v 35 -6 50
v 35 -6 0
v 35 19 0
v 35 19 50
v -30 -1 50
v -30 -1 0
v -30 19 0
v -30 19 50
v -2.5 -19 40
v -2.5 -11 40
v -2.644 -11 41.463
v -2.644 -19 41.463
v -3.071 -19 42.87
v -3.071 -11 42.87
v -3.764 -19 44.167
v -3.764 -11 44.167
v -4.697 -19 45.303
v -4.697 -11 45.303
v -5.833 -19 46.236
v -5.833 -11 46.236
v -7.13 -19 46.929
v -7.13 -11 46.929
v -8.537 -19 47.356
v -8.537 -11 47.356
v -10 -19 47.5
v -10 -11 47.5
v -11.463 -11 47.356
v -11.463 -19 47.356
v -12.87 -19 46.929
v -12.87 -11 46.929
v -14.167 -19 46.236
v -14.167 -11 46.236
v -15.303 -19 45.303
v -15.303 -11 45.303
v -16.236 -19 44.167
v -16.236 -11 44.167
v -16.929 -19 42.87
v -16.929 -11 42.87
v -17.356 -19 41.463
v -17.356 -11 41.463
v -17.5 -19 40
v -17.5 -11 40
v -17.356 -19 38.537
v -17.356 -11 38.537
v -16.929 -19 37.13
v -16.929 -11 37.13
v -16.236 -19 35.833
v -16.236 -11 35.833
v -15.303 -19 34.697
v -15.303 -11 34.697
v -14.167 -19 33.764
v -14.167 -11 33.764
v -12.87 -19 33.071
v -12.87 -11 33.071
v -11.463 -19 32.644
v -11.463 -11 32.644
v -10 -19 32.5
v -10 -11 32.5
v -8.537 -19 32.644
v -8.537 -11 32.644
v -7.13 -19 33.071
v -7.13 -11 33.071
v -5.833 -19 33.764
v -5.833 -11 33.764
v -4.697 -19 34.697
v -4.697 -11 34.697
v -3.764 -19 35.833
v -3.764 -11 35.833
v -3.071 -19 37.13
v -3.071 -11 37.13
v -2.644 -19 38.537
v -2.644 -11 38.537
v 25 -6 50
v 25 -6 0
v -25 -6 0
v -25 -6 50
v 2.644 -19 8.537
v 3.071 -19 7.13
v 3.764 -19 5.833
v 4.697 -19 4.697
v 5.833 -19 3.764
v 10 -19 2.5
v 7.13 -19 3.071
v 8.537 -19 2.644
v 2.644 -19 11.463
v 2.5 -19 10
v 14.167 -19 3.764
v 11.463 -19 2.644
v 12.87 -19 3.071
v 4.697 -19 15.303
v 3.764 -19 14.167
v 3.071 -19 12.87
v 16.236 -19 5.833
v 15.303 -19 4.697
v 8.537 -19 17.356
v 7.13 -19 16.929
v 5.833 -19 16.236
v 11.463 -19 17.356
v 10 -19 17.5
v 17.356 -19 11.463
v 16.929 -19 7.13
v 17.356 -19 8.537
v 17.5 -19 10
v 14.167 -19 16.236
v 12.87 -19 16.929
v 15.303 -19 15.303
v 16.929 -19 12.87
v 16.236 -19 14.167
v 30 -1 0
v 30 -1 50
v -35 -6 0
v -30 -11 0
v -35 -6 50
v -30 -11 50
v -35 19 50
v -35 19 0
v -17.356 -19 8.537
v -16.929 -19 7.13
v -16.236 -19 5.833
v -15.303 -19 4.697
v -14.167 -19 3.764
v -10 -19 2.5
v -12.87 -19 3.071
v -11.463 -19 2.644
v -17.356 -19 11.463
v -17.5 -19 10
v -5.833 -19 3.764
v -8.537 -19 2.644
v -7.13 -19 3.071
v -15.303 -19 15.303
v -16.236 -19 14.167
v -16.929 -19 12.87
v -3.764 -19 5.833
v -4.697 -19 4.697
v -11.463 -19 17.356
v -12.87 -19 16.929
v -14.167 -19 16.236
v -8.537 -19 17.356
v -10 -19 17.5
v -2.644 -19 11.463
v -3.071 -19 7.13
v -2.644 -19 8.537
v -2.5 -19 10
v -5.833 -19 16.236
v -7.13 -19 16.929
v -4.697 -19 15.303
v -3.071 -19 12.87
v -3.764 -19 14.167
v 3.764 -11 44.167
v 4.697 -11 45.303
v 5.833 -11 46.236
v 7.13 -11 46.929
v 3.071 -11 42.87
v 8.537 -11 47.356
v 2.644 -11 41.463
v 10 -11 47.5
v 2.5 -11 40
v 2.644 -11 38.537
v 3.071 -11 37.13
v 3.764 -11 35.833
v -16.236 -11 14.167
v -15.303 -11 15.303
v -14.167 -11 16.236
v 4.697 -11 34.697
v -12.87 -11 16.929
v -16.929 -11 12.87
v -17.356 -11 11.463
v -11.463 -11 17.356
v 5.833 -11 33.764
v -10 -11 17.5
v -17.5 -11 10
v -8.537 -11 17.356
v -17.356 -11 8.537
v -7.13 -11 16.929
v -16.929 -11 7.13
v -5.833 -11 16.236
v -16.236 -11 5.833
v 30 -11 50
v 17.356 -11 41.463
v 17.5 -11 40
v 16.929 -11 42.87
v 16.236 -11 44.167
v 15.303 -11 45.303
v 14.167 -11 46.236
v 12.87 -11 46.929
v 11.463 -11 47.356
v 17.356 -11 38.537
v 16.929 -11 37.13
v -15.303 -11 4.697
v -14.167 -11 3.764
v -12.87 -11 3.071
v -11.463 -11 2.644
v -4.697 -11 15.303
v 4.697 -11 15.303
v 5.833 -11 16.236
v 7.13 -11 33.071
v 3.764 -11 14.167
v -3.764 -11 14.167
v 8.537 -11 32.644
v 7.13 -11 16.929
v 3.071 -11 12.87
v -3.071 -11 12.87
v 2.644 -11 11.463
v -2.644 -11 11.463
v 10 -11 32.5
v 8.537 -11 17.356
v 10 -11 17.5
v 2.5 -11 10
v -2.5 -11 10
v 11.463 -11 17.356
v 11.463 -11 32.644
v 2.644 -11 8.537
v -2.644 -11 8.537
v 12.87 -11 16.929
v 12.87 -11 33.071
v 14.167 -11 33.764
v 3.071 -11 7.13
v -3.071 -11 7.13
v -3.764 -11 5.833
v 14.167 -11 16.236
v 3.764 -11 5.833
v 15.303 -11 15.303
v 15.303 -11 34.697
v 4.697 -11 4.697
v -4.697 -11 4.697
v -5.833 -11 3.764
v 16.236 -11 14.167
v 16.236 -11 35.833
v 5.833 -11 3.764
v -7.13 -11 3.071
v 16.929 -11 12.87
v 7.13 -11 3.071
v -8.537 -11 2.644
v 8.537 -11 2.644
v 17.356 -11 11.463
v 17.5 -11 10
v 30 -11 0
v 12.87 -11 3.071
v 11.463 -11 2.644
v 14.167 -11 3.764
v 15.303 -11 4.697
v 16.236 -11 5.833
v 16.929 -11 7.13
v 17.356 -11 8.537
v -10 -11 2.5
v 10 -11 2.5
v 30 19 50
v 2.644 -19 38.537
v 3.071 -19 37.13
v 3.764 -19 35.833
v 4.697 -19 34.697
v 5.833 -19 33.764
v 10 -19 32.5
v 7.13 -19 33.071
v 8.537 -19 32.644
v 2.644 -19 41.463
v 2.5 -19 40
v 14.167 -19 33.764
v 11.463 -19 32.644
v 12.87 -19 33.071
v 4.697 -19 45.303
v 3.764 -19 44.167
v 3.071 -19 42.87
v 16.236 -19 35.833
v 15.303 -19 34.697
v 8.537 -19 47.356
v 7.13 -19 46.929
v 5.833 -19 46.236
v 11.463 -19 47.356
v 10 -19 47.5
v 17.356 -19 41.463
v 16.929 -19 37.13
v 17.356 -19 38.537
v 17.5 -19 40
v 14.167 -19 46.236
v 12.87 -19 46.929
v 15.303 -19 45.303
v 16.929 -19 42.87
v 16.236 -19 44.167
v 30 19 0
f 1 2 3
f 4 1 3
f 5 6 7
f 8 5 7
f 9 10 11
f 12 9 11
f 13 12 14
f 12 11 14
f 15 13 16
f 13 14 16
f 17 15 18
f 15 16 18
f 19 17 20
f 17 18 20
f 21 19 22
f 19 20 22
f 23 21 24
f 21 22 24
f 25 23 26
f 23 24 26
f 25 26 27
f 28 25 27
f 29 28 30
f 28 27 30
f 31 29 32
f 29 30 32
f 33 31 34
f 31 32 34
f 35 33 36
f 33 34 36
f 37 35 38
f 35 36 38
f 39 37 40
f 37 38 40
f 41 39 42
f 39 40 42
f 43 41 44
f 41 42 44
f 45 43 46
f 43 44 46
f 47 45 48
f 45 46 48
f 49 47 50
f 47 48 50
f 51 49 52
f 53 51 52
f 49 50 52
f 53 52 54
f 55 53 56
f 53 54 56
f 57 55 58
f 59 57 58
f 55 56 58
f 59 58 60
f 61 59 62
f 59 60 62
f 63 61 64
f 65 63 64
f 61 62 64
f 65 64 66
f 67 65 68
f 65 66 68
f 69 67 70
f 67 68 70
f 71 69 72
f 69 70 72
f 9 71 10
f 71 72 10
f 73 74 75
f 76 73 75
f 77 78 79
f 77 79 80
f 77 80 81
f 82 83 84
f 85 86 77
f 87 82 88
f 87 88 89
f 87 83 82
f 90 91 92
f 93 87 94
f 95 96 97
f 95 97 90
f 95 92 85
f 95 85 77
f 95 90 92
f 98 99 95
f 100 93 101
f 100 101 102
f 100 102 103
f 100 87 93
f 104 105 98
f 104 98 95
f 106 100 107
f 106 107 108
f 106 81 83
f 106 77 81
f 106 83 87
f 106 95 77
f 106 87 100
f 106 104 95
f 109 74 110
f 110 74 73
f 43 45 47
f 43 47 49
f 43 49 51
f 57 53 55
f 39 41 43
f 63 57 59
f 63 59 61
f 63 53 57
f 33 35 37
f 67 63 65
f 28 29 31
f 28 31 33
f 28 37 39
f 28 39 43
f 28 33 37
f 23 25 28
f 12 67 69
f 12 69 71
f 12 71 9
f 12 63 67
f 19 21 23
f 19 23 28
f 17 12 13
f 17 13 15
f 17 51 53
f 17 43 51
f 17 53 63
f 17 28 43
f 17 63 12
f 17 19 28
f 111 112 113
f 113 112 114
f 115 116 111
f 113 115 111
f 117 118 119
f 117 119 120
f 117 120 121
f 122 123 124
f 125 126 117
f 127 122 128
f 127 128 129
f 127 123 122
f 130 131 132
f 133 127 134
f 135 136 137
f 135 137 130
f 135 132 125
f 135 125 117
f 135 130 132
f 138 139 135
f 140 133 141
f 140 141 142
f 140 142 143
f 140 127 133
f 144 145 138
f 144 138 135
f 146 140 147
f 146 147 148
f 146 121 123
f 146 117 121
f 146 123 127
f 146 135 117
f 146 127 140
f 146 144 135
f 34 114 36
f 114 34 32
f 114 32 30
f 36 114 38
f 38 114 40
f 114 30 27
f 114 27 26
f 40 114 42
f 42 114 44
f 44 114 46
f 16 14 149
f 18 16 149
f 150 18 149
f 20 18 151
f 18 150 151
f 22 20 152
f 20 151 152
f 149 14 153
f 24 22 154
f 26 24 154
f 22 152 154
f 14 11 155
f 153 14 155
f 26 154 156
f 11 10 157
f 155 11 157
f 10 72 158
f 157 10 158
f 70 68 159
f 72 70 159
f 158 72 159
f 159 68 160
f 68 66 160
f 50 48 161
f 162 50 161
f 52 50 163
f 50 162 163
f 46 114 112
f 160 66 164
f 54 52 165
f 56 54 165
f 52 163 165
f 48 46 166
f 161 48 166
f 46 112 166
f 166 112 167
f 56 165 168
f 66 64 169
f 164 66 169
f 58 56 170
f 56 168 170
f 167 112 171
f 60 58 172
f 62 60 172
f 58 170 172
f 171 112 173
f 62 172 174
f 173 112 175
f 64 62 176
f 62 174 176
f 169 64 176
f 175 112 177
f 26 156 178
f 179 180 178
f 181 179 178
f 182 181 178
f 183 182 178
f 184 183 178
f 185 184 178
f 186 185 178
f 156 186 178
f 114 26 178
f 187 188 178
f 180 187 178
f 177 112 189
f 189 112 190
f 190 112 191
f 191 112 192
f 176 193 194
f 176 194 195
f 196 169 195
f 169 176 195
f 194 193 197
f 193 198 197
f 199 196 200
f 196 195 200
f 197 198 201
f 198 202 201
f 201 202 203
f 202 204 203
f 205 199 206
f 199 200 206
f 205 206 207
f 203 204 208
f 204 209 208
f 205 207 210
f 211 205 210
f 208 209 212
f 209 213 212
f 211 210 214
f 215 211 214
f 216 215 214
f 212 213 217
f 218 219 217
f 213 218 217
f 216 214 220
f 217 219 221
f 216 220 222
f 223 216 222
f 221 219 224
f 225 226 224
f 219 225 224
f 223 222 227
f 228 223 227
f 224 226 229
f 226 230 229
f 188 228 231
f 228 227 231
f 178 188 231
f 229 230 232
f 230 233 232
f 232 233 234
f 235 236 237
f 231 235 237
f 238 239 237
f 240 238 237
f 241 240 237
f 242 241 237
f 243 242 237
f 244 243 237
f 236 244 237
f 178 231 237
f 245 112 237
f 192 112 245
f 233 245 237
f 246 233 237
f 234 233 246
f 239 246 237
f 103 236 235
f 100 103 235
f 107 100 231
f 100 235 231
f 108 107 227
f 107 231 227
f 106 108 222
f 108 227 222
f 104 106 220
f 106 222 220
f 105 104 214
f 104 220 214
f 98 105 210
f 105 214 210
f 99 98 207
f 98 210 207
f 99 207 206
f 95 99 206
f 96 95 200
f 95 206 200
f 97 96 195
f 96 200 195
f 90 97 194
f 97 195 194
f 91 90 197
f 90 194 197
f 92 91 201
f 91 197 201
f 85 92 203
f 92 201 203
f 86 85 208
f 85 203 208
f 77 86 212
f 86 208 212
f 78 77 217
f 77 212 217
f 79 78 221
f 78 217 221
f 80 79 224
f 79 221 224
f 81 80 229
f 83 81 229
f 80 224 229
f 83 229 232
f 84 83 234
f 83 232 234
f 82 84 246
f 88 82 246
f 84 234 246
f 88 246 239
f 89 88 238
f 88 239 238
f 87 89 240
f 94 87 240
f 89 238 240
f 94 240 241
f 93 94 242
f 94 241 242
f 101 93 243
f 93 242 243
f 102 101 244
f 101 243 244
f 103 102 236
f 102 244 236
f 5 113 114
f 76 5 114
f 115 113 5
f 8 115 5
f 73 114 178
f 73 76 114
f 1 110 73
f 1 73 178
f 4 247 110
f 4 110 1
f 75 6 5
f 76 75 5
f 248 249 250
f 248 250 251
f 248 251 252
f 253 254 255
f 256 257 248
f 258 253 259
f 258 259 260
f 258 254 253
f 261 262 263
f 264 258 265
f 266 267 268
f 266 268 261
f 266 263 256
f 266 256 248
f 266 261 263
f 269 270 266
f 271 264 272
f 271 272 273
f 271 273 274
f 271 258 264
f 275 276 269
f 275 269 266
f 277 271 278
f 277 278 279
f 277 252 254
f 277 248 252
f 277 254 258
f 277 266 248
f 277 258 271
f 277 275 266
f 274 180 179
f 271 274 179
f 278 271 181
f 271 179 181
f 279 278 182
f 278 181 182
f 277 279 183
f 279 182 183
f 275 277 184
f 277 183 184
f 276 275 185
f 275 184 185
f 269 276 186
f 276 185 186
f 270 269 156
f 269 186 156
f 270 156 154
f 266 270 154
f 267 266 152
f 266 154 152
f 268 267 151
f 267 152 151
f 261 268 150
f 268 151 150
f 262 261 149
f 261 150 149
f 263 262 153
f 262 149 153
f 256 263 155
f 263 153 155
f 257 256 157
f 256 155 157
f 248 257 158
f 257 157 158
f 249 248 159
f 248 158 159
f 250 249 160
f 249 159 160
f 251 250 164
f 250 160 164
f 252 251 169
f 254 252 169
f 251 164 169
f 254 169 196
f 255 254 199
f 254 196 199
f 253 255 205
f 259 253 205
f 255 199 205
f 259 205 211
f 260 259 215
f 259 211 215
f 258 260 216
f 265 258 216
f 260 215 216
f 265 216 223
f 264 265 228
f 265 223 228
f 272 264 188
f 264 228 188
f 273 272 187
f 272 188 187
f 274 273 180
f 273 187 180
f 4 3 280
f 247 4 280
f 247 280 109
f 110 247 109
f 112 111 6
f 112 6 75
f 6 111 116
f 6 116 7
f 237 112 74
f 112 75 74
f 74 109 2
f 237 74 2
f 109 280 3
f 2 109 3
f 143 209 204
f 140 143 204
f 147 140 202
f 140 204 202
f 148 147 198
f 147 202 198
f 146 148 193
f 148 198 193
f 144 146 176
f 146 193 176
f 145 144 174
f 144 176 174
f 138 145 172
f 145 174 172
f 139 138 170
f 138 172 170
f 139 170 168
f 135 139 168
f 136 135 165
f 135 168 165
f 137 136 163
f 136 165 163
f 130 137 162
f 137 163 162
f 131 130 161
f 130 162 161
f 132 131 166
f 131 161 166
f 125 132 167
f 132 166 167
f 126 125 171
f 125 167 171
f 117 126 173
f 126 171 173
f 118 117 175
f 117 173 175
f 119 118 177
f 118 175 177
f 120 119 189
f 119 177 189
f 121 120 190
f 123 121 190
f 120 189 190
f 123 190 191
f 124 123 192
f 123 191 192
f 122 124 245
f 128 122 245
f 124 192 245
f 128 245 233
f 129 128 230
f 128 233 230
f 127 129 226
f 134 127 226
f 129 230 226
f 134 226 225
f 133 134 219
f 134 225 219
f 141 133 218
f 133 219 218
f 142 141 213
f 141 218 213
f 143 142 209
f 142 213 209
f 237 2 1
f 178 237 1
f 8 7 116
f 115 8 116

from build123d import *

# Parameters (mm, degrees)
F1_DEPTH = 50
F2_SIZE  = 5
F3_R     = 7.5
F4_DEPTH = 8


with BuildPart() as f1:
    # F0 (on Top) → F1 (new body)
    with BuildSketch(Plane.XY):
        Polygon((-30, 19), (-35, 19), (-35, -11), (0, -11), (35, -11), (35, 19), (30, 19), (30, -6), (0, -6), (-30, -6), align=None)
    extrude(amount=F1_DEPTH)

    # F2
    f2_edges = [f1.edges().sort_by_distance(p)[0] for p in [
        (-30, -6, 25),
        (30, -6, 25),
        (-35, -11, 25),
        (35, -11, 25),
    ]]
    chamfer(f2_edges, length=F2_SIZE)

    # F3 (on face) → F4 (join)
    with BuildSketch(Plane.XZ.offset(11)):
        with Locations((-10, 40)):
            Circle(F3_R)
        with Locations((-10, 10)):
            Circle(F3_R)
        with Locations((10, 40)):
            Circle(F3_R)
        with Locations((10, 10)):
            Circle(F3_R)
    extrude(amount=F4_DEPTH)


solid = f1.part
